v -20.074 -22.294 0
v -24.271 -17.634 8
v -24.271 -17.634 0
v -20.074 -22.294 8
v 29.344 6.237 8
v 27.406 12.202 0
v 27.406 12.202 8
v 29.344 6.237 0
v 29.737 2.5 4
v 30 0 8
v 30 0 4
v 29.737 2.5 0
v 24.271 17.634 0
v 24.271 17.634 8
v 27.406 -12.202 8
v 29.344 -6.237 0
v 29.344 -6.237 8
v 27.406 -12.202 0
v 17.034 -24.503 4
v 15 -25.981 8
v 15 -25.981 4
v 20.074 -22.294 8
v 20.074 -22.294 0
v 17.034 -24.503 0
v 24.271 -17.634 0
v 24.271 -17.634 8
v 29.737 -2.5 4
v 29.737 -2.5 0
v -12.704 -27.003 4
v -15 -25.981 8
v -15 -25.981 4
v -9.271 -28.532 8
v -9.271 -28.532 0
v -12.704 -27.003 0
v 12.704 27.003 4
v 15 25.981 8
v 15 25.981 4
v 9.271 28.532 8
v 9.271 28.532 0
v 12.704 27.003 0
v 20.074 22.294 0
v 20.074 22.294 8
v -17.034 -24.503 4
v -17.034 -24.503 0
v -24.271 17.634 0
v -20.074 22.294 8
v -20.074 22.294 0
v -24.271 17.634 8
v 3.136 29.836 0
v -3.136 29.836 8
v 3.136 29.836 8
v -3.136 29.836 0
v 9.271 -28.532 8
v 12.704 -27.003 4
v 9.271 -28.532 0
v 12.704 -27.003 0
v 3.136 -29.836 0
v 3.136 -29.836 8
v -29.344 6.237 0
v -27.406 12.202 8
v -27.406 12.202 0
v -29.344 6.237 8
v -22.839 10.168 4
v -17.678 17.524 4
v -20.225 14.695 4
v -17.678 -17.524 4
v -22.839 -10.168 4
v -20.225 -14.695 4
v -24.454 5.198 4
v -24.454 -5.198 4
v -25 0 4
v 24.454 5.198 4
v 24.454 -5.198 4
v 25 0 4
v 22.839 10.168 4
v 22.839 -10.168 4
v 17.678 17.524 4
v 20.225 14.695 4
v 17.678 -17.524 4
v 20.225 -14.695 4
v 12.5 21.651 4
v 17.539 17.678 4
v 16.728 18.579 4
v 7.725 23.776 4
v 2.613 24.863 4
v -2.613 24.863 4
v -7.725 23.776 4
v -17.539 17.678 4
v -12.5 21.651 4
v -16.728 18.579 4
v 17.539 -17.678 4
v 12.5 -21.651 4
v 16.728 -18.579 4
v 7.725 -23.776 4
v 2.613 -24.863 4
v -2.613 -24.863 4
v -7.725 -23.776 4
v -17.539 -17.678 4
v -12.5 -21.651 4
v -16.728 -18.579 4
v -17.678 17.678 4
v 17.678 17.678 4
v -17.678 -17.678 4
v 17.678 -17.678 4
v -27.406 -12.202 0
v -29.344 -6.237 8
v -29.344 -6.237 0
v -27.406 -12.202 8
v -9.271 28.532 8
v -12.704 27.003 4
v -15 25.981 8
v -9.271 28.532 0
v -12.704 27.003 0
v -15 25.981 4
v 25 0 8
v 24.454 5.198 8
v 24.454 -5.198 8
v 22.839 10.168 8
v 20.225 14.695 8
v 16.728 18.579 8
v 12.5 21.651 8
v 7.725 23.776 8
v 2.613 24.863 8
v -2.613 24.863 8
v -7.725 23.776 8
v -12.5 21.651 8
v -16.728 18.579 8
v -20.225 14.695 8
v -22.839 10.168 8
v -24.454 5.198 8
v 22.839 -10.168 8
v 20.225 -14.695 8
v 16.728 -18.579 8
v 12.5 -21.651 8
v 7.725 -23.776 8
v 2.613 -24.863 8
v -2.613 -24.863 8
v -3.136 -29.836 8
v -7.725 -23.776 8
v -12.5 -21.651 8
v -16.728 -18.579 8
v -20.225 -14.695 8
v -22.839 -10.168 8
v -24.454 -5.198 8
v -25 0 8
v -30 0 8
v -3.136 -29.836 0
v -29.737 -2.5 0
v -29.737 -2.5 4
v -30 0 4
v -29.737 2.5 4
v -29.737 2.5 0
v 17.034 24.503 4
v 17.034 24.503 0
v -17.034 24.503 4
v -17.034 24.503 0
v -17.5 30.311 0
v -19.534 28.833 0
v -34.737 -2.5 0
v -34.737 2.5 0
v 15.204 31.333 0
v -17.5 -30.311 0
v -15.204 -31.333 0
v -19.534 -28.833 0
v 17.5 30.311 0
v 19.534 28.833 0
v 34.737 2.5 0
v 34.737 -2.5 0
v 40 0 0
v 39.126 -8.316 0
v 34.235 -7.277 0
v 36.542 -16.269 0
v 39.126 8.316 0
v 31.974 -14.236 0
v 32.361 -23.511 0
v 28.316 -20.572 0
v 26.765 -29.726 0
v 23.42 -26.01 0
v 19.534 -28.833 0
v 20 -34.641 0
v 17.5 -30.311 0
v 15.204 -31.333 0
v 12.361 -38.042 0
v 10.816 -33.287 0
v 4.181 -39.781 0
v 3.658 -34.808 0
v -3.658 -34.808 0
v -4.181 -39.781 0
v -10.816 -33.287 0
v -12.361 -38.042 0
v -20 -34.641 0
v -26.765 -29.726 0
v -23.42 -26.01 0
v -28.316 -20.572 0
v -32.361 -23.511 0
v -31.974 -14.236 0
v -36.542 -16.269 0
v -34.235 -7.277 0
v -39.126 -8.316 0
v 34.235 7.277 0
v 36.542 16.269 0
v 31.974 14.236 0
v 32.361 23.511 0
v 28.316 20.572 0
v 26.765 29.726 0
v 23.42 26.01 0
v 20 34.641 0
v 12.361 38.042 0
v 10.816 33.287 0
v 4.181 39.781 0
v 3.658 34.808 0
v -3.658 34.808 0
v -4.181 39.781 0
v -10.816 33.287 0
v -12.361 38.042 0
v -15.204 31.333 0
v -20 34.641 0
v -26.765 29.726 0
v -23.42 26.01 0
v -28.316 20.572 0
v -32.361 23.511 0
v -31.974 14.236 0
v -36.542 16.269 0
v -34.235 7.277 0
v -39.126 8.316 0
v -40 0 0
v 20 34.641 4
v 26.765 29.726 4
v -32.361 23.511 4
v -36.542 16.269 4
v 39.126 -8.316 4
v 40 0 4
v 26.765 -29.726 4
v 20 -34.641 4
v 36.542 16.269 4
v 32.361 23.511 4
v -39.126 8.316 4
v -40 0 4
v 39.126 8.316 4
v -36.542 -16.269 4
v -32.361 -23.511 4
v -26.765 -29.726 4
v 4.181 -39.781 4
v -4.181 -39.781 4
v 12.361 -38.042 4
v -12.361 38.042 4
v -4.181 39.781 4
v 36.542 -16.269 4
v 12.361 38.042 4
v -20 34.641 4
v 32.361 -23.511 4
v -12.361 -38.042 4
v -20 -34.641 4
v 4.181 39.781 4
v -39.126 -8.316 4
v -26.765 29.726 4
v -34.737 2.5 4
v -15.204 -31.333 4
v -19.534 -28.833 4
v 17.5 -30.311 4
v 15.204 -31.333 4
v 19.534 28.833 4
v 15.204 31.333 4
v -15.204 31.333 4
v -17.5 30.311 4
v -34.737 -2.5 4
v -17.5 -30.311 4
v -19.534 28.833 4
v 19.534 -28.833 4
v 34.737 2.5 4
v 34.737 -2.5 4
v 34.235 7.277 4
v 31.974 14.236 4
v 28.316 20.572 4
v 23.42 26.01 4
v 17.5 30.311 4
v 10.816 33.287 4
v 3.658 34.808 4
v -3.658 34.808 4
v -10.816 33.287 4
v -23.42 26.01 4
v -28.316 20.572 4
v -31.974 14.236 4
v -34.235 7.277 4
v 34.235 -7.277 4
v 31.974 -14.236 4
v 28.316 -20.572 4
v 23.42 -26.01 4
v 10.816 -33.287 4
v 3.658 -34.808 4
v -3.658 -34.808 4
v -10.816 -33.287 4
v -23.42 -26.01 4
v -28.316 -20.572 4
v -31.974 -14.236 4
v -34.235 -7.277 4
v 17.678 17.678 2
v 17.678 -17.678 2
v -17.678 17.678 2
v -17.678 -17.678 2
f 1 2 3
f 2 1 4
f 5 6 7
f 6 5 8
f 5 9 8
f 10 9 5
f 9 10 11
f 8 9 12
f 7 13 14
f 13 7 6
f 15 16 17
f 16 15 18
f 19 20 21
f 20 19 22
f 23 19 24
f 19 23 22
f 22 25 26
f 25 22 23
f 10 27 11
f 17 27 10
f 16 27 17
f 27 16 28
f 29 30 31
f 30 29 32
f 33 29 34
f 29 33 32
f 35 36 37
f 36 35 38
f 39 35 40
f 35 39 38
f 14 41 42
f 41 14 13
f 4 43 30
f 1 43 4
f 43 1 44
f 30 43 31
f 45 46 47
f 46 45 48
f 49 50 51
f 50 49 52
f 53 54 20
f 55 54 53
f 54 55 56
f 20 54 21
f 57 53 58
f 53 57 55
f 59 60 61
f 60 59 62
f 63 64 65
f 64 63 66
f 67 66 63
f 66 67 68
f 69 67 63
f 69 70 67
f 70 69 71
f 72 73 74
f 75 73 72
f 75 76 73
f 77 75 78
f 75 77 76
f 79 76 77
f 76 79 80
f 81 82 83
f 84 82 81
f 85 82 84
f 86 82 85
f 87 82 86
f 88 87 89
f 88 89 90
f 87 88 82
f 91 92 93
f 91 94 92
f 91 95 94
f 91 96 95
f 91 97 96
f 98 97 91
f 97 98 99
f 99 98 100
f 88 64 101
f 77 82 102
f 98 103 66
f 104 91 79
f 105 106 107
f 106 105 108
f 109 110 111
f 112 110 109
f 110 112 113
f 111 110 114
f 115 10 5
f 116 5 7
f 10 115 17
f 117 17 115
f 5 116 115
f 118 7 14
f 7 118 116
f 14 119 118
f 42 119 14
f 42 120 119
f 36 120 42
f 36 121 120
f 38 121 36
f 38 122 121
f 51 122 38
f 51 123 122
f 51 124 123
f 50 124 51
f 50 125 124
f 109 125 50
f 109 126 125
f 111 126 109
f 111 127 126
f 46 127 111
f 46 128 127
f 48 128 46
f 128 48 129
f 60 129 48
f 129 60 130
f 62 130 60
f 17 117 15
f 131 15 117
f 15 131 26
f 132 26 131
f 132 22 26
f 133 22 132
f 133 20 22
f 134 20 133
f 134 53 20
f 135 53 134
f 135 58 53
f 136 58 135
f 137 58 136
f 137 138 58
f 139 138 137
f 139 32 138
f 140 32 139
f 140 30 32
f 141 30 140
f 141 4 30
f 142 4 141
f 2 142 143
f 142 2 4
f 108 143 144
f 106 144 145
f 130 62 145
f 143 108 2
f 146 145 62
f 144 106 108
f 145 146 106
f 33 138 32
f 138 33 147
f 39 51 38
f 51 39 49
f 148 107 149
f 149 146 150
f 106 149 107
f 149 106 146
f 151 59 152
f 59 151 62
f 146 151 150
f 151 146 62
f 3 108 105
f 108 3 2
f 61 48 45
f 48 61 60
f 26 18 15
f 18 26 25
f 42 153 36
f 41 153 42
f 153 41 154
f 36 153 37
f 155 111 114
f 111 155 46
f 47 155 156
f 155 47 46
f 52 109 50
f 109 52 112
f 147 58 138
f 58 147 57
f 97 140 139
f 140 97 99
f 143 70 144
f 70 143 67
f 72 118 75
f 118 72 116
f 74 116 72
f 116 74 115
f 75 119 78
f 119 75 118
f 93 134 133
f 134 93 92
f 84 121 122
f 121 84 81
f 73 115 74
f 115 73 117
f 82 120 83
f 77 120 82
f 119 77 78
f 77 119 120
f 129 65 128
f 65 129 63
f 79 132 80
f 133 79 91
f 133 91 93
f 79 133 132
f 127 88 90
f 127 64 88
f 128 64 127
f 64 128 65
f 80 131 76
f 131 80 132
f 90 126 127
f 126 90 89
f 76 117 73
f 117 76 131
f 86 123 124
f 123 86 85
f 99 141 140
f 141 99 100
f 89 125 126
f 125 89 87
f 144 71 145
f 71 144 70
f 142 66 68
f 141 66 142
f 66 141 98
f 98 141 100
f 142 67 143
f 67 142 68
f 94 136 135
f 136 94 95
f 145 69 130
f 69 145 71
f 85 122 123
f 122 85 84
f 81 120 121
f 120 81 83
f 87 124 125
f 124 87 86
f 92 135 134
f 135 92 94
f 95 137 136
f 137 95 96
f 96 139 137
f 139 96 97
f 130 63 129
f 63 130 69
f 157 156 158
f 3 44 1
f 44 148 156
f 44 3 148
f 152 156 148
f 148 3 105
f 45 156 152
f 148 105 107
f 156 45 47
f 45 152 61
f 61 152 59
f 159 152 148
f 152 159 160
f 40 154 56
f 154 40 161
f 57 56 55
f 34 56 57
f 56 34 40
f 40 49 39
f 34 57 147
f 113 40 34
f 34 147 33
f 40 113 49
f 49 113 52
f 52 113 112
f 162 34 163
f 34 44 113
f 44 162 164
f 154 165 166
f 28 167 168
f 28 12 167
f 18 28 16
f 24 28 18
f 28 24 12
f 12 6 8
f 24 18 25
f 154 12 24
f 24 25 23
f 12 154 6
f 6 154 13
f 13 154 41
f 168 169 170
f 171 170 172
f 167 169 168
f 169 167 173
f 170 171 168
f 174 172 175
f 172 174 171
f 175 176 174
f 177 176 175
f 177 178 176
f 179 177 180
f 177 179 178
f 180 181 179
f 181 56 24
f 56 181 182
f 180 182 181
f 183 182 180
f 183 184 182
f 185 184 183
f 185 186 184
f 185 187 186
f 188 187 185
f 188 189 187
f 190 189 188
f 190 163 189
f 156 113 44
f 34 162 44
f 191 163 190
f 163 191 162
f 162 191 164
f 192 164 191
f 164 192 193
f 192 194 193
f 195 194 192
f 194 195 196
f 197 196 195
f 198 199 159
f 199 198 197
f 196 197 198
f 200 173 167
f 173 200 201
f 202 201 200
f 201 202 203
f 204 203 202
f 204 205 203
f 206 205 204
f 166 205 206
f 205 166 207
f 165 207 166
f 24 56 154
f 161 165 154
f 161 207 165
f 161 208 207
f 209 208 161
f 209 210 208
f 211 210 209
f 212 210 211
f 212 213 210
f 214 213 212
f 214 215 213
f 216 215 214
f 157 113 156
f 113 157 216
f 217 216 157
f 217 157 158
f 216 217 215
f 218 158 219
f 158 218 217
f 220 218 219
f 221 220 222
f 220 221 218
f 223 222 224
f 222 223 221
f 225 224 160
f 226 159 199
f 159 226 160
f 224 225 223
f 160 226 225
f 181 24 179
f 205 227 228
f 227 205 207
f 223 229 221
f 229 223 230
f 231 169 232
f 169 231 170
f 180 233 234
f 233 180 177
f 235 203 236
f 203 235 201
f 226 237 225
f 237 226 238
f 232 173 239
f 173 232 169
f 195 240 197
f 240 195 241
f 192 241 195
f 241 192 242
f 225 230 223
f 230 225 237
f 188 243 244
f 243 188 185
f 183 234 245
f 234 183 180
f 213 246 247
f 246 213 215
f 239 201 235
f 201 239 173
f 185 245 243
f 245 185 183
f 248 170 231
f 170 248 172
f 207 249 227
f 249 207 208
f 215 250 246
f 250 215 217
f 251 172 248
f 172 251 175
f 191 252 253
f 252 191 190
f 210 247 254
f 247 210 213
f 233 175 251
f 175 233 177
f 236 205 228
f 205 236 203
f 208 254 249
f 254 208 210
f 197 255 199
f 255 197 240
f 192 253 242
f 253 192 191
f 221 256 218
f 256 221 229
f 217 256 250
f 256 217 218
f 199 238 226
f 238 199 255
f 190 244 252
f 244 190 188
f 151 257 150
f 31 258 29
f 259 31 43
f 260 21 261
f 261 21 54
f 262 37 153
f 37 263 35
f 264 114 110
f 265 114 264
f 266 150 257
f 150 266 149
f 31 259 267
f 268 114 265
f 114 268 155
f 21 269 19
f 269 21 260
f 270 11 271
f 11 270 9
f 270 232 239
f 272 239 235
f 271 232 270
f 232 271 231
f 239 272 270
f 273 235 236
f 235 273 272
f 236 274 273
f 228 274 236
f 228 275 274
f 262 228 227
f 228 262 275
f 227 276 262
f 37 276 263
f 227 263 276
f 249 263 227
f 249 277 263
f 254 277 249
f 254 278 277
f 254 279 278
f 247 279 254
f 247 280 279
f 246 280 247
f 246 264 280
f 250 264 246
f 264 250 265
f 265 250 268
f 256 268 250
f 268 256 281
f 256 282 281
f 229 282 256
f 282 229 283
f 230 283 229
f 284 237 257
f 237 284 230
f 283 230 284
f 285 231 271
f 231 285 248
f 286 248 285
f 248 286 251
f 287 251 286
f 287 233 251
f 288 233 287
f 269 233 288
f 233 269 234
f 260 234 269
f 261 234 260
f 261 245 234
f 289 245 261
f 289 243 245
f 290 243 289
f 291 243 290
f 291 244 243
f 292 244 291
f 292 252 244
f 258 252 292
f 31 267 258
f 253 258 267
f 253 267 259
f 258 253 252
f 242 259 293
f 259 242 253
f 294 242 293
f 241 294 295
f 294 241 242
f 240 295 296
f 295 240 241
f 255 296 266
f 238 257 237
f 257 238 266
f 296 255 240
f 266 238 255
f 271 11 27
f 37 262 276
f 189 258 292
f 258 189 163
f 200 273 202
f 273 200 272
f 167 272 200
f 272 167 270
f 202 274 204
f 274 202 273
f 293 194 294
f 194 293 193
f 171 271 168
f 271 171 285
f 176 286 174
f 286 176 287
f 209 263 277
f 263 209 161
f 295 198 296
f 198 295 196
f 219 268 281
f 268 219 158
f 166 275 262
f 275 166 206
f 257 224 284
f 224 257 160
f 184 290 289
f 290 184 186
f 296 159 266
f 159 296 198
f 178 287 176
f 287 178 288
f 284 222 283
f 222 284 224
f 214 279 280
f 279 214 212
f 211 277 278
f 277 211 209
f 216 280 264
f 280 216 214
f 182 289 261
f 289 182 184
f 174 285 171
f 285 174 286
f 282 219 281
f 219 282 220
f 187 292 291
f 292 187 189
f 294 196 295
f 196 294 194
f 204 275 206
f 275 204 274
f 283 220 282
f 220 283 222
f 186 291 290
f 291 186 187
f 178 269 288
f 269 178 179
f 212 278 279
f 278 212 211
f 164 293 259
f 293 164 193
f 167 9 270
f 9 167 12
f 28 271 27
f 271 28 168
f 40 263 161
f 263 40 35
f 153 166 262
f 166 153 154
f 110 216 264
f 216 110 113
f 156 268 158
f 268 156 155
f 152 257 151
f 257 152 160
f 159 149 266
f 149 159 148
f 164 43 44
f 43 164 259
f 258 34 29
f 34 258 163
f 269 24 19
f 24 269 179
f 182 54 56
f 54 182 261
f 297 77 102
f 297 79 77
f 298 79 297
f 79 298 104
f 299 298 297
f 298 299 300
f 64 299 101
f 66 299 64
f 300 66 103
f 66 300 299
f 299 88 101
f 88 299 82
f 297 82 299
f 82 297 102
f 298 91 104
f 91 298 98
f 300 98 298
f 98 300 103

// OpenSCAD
// file: ../src/symbol.scad
//Данный модуль строит 3д символ компании (image/symbol.png) 
module symbol(x,y,z) {
    symbol_file = "../image/symbol.png";
    symbol_x = 100;
    symbol_y = 100;
    
    scale([1/symbol_x*x,1/symbol_y*y,1/100*z])
    translate([0,0,100])
    surface(file=symbol_file, invert=true,center=true);
}

//Демонстрационный код.
//symbol(40,40,10);
// file: ../src/rim.scad
module rim(er, ir, h) {
    difference() {
        cylinder(r=er, h=h);
        cylinder(r=ir, h=h);
    }
}

//Круговая база с ободком.
module based_rim(er, ir, h, bh) {
    union() {
        cylinder(r=er, h=bh);
        translate([0,0,bh]) rim(er,ir,h-bh);
    }
}


//Демонстрационный код.
//based_rim(30, 25, 8, 3);
// file: ../src/ear.scad
//Угловатое квадратное ухо.
//"w" - толщина уха
module sqr_ear(y,x,w,h) {
    translate([-y/2,0,0])
    difference() {
        cube([y,x,h]);
        translate([w,0,0]) cube([y-w*2,x-w,h]);
    }
}

//Ухо со сглаженными углами.
//"y" - должен быть больше чем "x".
//"w" - толщина уха
module slc_ear(y,x,w,h){
    rotate([0,0,90])
    translate([0,-y/2,0])
    linear_extrude(height=h)
    polygon([
    [0,0],
    [x/2,0],
    [x,x/2],
    [x,y-x/2],
    [x/2,y],
    [0,y],
    [0,y - w],
    [x/2 - w * sin(45/2),y - w],
    [x - w * sin(45/2*3),y -x/2 - w * cos(45/2*3)],
    [x - w * sin(45/2*3),x/2 + w * cos(45/2*3)],
    [x/2 - w * sin(45/2),w],
    [0,w],
    ]);       
}

//Ухо в виде ободка.
module rim_ears(er,ir,iir,w,h,n) {
    union() {
        difference() {
            cylinder(r=er, h=h);
            cylinder(r=ir, h=h);
        }
        difference() {
            for(fi = [0 : 360/n : 359]) 
            rotate([0,0,fi])
            translate([0,-w/2,0])cube([ir,w,h]);
            cylinder(r=iir,h=h);
        }
    }
}

module radiused(offset,radius) {
    ystate = sqrt(radius*radius - offset*offset);
    translate([0,ystate,0]) children(0);
}

//Демонстрационный код:
//  Массив sqr_ear.
/*for(fi = [0 : 60 : 359]) 
    rotate([0,0,fi])
    radiused(10,30) sqr_ear(10,6,2,3);*/

//  Массив slc_ear.
/*for(fi = [0 : 60 : 359]) 
    rotate([0,0,fi])
    radiused(10,30) slc_ear(10,6,2,3);*/

//  Круговое ухо (rim_ears).
//rim_ears(40,35,30,4,3,3);
// main file
include<../src/ear.scad>
include<../src/rim.scad>
include<../src/symbol.scad>

externalRadius=30;
internalRadius=25;
height=8;
baseHeight=4;
symbHeight=6;
earLength=10;
earWidth=5;
earSz = 2;
earTotal=12;

symbsize = sqrt(2)*internalRadius;
symbdeep = 2;
symblevel = baseHeight-symbdeep;

module ringbase(
    externalRadius,
    internalRadius,
    height,
    baseHeight,
    earLength,
    earWidth,
    earEmptySz,
    earTotal) { 
    step = 360 / earTotal;
    union() {
        based_rim(externalRadius,internalRadius,height,baseHeight);
        /*for(fi = [0 : step : 359]) 
            rotate([0,0,fi]) radiused(earLength/2,externalRadius)
            sqr_ear(earLength,
                earWidth,earSz,baseHeight,externalRadius);*/
        /*for(fi = [0 : step : 359]) 
            rotate([0,0,fi]) radiused(earLength/2,externalRadius)
            slc_ear(earLength,
                earWidth,earSz,baseHeight,externalRadius);*/
        rim_ears(40,35,externalRadius,5,baseHeight,6);
        
    }    
}

union() {
difference(){
    ringbase(
    externalRadius=externalRadius,
    internalRadius=internalRadius,
    height=height,
    baseHeight=baseHeight,
    earLength=earLength,
    //earEmptyLength=earEmptyLength,
    earWidth=earWidth,
    //earEmptyWidth=earEmptyWidth,
    earSz=earSz,
    earTotal=earTotal
    );
    translate([-symbsize/2,-symbsize/2,baseHeight-symbdeep])
    cube([symbsize,symbsize,symbdeep]);
}
translate([0,0,symblevel])
    symbol(symbsize, symbsize, symbHeight-symblevel);
}
